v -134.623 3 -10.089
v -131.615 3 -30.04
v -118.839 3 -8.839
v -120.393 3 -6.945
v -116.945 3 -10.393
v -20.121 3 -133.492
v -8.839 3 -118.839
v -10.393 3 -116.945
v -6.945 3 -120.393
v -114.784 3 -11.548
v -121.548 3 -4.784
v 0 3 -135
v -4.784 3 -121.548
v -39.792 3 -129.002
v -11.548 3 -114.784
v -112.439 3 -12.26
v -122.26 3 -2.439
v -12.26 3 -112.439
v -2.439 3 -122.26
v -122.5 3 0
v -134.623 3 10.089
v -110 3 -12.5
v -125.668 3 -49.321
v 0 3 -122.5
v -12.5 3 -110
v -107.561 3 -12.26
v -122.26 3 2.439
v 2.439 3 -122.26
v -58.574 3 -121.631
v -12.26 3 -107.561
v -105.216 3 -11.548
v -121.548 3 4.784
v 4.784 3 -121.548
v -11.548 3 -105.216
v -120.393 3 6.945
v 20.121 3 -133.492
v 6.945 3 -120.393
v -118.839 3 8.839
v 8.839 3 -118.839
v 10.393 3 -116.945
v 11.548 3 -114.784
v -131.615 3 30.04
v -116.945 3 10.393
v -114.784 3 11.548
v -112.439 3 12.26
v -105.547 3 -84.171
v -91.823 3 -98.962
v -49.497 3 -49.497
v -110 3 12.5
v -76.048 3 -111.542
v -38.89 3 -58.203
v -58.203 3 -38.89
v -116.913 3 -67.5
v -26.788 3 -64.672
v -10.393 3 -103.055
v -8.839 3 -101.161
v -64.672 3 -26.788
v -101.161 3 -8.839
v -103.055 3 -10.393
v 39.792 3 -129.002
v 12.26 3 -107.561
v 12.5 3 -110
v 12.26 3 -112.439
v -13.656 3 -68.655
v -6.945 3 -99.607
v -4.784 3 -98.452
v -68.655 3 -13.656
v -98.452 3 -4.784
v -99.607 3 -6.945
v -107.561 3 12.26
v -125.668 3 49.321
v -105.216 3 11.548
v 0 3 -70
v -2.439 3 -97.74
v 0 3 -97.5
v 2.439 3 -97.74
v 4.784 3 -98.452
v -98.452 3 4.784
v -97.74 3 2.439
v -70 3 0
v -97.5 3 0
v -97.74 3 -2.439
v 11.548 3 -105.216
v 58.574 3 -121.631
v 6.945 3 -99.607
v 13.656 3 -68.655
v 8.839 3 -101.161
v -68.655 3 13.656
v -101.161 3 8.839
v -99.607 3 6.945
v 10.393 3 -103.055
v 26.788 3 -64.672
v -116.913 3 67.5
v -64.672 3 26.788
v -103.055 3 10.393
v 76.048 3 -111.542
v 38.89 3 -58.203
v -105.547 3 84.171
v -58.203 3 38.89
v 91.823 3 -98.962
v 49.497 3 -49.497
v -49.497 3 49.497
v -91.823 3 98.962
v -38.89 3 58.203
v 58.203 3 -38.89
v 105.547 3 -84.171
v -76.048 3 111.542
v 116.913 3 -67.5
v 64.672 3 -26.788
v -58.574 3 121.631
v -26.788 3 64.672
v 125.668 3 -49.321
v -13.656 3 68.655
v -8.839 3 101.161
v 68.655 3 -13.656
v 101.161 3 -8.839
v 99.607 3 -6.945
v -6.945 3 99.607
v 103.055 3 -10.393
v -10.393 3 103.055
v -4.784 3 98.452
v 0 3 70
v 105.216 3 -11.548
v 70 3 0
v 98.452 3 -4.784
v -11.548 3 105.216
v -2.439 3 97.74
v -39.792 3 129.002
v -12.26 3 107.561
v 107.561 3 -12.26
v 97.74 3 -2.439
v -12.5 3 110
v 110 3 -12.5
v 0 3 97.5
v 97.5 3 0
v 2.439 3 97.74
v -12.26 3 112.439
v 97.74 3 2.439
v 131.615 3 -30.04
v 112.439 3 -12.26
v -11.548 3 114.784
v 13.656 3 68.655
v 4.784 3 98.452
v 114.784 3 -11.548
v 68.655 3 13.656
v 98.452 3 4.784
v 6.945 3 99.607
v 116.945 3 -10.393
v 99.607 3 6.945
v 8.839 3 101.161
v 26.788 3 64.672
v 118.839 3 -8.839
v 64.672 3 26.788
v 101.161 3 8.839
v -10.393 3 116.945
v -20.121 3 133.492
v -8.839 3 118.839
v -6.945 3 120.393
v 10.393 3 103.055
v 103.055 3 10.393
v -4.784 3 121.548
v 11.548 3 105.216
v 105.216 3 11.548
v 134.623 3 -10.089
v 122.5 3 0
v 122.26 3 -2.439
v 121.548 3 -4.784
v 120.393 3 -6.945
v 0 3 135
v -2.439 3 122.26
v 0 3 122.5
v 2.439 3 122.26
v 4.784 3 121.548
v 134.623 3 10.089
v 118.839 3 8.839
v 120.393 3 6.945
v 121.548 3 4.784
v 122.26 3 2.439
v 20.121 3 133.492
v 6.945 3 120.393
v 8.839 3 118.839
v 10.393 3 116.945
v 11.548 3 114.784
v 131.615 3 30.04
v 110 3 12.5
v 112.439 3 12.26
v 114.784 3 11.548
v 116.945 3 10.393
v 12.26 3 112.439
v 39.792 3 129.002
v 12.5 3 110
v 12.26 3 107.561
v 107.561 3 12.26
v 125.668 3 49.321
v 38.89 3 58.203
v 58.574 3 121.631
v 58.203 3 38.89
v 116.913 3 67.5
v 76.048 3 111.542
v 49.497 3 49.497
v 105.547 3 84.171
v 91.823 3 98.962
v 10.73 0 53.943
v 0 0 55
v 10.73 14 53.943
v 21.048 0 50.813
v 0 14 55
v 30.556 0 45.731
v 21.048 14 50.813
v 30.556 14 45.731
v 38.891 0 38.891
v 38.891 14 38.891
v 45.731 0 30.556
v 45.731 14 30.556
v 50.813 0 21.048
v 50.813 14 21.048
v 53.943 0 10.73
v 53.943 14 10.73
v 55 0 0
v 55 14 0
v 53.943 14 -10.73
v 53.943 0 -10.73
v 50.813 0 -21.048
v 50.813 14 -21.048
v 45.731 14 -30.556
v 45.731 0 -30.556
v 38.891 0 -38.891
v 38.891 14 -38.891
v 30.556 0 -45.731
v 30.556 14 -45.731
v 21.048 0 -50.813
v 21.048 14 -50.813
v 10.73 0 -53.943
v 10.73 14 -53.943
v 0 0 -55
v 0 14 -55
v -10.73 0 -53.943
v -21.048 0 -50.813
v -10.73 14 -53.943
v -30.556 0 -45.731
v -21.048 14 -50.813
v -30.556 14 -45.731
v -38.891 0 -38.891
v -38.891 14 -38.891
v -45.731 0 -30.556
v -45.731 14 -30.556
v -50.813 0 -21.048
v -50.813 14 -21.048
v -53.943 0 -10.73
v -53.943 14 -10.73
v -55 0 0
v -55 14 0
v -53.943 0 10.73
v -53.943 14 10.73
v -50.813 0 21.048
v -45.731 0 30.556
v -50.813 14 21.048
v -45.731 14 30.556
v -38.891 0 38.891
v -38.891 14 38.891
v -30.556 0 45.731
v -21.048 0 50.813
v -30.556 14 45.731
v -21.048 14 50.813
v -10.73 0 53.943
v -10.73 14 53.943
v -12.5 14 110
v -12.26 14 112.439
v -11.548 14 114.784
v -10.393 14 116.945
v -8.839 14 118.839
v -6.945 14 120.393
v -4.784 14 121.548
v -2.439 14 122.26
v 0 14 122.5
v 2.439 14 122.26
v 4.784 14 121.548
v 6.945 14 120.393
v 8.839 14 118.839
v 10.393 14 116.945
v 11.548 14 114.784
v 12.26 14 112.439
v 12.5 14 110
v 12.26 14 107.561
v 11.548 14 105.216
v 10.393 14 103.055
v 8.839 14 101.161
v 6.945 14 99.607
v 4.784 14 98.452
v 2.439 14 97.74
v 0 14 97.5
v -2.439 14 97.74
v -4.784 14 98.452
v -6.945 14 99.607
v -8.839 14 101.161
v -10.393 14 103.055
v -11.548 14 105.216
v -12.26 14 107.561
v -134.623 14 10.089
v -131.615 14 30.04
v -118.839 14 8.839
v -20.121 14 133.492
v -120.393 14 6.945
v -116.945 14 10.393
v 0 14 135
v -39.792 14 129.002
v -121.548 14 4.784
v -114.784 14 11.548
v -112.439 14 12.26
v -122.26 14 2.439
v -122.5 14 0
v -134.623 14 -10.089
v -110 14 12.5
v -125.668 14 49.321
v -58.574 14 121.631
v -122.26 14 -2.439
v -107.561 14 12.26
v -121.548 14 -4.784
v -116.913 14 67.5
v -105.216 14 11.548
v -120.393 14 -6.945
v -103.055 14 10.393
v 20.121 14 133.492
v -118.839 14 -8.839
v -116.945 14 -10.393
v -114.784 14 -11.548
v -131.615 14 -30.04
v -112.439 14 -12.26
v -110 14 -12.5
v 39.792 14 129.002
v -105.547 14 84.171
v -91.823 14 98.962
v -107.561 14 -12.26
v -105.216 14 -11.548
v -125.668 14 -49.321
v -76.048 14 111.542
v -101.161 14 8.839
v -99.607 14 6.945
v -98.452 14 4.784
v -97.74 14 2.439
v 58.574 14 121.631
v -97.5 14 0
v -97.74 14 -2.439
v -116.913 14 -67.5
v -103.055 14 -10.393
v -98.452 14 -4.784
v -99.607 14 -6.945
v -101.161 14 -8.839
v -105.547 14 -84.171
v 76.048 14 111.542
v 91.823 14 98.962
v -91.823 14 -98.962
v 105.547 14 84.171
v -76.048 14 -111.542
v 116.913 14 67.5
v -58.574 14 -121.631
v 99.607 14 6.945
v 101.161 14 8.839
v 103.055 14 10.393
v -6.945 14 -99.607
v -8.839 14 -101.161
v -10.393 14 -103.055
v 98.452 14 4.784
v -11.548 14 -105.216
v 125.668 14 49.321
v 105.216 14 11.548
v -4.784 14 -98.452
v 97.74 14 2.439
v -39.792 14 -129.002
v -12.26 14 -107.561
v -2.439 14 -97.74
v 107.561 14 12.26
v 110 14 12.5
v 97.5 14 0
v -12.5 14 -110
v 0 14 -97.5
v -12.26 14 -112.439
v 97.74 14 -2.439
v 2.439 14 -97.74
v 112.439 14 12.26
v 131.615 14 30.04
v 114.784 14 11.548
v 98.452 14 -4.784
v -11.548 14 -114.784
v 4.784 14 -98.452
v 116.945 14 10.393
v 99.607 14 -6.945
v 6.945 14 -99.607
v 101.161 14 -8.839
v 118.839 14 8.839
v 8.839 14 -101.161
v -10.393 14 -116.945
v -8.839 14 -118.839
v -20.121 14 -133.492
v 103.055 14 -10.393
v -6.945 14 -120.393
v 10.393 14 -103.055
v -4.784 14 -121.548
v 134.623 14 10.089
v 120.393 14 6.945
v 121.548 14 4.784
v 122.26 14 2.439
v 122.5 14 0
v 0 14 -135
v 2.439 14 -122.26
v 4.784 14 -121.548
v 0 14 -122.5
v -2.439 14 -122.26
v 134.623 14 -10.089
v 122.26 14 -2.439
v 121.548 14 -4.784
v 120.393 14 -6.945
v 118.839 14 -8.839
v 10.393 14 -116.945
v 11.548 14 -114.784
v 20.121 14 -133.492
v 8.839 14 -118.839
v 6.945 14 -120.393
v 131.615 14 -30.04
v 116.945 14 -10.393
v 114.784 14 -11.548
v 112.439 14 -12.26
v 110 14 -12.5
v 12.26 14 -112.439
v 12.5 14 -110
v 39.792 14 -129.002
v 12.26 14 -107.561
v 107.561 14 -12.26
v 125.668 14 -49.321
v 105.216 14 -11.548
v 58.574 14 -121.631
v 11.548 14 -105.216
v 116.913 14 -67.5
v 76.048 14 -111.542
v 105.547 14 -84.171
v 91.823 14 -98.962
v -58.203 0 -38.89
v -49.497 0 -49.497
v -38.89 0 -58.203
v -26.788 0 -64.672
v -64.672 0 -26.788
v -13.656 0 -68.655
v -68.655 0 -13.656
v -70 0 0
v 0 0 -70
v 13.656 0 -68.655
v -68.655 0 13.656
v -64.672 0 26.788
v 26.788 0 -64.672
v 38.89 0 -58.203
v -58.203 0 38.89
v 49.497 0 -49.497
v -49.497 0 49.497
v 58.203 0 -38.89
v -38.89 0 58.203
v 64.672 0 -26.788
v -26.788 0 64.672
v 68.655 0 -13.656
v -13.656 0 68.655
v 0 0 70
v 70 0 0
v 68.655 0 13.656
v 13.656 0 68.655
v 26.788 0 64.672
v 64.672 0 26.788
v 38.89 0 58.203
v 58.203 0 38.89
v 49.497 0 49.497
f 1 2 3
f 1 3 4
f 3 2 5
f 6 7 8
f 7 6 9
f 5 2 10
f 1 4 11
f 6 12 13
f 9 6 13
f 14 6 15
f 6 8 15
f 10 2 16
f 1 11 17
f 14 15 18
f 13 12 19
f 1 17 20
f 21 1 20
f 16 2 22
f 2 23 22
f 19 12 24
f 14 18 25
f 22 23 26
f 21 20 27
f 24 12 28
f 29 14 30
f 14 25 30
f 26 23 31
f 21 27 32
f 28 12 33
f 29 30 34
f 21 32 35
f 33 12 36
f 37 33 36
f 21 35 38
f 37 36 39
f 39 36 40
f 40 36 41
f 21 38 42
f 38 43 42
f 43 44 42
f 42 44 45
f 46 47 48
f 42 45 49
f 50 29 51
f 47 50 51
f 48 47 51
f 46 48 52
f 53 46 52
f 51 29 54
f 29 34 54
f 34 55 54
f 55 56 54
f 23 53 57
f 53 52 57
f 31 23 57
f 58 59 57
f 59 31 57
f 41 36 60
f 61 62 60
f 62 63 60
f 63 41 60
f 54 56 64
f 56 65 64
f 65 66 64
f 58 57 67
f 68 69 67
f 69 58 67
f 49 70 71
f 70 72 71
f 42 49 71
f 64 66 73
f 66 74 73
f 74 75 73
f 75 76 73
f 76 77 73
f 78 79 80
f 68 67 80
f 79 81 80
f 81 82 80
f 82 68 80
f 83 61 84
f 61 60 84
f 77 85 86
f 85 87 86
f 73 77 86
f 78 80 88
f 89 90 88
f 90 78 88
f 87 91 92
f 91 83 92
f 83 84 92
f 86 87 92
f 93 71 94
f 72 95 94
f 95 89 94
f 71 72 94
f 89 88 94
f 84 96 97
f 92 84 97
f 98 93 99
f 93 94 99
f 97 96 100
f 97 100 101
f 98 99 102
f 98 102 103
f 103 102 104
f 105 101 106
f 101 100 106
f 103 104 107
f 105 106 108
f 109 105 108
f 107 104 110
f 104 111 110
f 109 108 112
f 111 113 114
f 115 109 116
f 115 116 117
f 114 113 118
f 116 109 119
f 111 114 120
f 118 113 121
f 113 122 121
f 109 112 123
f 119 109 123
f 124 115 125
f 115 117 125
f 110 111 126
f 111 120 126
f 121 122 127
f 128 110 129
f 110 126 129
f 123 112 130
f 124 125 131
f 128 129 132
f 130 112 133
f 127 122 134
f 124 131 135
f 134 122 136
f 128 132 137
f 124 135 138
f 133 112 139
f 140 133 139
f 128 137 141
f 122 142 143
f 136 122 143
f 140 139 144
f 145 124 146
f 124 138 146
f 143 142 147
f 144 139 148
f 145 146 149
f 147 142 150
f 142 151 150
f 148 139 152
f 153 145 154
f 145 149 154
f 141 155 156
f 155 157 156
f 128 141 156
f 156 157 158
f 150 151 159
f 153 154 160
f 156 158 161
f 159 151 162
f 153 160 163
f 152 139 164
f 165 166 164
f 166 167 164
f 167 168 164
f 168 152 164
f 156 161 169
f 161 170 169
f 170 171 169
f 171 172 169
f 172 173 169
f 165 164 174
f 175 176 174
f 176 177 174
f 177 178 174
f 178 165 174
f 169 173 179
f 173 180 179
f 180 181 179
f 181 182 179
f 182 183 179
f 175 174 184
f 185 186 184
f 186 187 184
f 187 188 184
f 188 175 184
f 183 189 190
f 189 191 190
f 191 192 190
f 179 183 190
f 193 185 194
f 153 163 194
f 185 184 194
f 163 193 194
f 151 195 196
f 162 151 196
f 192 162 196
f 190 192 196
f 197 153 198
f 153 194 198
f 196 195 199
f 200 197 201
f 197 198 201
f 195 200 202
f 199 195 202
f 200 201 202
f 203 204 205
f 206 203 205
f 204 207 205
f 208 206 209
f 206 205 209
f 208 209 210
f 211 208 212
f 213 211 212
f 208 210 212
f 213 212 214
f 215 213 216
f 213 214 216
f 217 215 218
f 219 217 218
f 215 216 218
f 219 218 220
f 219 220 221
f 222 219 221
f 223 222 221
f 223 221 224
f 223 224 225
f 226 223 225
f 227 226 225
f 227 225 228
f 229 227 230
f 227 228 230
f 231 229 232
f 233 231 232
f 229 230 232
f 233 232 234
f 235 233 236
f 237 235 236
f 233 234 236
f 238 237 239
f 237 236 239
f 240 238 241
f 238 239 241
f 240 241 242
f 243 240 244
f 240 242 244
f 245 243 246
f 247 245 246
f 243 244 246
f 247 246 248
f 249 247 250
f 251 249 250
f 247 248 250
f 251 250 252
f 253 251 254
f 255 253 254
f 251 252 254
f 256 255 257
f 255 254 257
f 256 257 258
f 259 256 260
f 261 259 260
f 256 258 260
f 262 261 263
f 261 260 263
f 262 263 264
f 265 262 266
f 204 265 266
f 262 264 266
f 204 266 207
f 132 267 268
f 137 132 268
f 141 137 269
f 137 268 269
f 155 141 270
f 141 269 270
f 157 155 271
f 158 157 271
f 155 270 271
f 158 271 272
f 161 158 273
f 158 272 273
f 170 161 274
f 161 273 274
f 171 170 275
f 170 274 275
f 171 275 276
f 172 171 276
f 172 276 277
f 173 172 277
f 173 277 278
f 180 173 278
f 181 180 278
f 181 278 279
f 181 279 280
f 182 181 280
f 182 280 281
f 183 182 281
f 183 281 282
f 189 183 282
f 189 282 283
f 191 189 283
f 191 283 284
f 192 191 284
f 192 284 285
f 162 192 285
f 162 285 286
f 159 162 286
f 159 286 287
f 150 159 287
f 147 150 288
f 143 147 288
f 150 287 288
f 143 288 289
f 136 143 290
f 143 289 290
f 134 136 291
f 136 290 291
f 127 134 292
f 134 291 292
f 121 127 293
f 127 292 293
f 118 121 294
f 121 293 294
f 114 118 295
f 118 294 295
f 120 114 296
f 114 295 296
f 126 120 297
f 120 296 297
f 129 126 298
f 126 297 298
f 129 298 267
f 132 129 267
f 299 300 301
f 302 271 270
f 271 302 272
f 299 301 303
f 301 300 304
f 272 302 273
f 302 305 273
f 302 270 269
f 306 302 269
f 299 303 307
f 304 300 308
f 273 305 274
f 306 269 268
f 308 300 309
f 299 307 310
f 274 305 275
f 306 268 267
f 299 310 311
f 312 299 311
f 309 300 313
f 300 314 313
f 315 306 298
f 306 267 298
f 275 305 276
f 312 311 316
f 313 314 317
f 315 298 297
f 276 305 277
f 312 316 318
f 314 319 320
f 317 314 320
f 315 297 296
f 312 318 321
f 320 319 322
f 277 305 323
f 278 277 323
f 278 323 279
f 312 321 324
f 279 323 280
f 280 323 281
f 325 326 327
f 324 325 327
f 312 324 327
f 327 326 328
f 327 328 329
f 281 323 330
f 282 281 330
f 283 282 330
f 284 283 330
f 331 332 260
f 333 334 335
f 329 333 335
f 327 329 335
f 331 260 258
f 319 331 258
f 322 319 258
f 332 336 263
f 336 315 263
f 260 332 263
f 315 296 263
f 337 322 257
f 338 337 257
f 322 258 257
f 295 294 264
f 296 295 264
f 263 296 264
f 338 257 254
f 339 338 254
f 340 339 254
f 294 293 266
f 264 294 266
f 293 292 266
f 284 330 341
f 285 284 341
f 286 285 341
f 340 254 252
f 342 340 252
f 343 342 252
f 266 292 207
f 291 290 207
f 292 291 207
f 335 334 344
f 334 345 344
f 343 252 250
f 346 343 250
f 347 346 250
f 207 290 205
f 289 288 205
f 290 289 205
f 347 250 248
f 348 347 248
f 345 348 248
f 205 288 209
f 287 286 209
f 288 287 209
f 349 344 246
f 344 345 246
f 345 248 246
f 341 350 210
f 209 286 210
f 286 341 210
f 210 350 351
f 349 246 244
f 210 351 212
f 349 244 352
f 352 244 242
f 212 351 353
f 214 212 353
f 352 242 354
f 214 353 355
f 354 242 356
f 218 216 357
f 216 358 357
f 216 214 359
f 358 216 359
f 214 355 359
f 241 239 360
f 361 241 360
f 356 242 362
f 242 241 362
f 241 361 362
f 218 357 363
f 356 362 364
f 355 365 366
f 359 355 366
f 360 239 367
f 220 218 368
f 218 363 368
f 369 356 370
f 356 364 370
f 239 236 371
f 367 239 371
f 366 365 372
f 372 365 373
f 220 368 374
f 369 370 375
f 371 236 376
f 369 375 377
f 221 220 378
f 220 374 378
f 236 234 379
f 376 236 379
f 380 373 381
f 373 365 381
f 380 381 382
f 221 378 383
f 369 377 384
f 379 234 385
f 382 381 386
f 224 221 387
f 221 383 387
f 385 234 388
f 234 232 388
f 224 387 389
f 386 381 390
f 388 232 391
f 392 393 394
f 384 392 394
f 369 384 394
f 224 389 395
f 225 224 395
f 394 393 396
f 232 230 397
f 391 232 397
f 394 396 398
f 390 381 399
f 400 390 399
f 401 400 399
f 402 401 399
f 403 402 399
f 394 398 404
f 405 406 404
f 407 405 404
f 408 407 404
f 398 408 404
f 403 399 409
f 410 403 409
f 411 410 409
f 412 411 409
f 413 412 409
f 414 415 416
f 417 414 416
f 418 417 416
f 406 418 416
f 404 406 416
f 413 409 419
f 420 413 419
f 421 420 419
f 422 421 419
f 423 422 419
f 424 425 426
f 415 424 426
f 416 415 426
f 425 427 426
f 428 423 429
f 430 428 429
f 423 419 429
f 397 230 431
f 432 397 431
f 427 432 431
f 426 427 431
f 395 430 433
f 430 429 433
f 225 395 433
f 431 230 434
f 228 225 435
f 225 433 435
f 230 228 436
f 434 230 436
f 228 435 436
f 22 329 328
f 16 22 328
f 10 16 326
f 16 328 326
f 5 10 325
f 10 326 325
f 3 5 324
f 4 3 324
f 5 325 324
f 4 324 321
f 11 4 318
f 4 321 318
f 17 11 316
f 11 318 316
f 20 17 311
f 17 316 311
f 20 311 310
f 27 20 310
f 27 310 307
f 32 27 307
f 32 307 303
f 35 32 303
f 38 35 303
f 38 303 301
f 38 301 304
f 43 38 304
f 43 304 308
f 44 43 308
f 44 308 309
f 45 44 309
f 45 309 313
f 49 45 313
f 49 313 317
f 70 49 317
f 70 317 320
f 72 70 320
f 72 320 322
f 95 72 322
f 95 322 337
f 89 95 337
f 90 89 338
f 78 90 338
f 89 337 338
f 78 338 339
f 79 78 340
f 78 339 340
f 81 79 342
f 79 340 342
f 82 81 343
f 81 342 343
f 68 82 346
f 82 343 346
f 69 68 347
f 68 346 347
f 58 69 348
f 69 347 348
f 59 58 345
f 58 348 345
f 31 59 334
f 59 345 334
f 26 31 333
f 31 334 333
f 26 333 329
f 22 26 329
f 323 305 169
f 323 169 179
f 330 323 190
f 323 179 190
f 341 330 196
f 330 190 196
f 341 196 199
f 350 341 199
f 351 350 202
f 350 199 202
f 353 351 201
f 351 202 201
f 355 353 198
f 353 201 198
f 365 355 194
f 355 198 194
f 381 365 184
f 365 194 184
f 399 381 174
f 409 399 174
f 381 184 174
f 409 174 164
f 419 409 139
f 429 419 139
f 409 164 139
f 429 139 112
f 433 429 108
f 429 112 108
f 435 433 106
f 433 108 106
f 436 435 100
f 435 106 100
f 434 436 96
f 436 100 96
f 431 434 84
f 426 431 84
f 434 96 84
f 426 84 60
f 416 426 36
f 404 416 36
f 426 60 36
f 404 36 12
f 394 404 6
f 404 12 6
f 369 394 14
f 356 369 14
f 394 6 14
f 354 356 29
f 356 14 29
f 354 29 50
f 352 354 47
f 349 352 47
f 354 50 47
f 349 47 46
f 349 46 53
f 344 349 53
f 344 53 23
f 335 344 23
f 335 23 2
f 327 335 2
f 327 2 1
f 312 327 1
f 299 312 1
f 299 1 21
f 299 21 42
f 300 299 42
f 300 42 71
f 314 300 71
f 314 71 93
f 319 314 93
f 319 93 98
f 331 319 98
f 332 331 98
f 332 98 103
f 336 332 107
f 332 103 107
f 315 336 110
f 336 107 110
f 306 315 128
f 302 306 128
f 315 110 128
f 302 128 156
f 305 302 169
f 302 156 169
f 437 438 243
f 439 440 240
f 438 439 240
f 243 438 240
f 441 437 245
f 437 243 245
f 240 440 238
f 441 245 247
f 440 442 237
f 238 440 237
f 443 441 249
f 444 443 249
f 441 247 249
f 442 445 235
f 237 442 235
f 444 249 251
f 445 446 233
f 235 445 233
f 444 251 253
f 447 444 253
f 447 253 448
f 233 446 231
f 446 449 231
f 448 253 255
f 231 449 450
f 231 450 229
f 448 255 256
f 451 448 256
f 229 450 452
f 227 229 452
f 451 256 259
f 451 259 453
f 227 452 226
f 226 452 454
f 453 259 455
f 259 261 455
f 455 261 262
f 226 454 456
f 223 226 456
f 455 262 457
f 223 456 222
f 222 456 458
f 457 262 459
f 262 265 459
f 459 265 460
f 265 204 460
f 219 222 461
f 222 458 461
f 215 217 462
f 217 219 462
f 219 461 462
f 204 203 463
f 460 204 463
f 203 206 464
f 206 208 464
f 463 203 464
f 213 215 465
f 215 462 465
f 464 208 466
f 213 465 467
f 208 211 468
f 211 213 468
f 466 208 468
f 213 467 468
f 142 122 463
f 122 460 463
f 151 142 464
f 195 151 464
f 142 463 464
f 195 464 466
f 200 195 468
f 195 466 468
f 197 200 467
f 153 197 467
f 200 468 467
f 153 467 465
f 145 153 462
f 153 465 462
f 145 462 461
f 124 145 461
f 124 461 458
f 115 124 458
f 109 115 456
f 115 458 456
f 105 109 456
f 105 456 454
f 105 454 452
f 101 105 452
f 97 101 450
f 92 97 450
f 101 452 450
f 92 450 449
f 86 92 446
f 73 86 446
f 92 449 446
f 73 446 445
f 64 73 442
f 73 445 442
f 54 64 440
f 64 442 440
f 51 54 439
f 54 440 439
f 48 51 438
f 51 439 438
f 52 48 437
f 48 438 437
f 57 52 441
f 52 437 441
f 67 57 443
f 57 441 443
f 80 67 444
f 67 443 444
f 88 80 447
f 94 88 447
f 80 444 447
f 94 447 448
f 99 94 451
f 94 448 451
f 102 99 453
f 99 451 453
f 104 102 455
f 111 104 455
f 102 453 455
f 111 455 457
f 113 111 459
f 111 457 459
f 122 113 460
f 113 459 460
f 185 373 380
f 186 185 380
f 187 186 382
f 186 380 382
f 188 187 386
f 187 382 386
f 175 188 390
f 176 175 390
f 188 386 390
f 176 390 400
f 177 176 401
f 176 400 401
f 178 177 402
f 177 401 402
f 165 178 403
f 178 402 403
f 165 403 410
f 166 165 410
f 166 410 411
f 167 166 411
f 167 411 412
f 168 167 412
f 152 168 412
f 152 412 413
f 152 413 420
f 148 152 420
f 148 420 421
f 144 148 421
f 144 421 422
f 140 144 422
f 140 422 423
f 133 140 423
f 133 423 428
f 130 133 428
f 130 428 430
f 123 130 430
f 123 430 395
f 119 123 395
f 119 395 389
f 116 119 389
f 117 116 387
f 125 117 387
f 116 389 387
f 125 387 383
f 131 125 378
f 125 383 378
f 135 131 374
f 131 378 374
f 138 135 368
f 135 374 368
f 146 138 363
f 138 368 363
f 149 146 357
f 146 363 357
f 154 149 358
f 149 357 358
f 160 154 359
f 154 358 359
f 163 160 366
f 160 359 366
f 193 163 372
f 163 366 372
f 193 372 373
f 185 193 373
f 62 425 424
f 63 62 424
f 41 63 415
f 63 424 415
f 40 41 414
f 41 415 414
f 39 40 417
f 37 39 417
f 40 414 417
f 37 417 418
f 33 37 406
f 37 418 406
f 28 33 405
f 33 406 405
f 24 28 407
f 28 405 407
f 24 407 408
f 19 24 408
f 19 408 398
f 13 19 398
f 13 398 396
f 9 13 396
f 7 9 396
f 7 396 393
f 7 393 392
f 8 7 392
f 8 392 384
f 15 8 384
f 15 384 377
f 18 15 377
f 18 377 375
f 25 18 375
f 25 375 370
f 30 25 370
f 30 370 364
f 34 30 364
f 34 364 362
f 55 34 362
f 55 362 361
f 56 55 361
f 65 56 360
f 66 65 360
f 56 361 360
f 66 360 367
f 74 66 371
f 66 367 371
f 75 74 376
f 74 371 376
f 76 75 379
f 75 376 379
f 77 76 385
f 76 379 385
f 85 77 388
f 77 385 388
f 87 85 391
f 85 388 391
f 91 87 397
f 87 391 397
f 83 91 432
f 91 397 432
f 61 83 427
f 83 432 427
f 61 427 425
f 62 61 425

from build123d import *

# Parameters (mm, degrees)
F3_D            = 25
F3_COPIES_COUNT = 4


# Not quite as in the source:
# - a pattern or mirror of a feature is missing from the dataset's text; its kind, count and spacing are read off the source's solid


with BuildPart() as f1:
    # F0 (on Right) → F1 (revolve)
    with BuildSketch(Plane.YZ):
        Polygon((0, 70), (0, 55), (14, 55), (14, 135), (3, 135), (3, 70), align=None)
    revolve(axis=Axis((0, 31.8317301571, 0), (0, 1, 0)))

    # F3 (through all)
    with Locations(Plane.XZ.offset(-3)):
        with Locations((0, 110)):
            f3 = Hole(F3_D / 2)

    # F3_copies: F3 ×4 about axis
    f3_copies_axis = Axis((0, 0, 0), (0, 1, 0))
    for i in range(1, F3_COPIES_COUNT):
        add(f3.rotate(f3_copies_axis, i * 360 / F3_COPIES_COUNT), mode=Mode.SUBTRACT)


solid = f1.part
